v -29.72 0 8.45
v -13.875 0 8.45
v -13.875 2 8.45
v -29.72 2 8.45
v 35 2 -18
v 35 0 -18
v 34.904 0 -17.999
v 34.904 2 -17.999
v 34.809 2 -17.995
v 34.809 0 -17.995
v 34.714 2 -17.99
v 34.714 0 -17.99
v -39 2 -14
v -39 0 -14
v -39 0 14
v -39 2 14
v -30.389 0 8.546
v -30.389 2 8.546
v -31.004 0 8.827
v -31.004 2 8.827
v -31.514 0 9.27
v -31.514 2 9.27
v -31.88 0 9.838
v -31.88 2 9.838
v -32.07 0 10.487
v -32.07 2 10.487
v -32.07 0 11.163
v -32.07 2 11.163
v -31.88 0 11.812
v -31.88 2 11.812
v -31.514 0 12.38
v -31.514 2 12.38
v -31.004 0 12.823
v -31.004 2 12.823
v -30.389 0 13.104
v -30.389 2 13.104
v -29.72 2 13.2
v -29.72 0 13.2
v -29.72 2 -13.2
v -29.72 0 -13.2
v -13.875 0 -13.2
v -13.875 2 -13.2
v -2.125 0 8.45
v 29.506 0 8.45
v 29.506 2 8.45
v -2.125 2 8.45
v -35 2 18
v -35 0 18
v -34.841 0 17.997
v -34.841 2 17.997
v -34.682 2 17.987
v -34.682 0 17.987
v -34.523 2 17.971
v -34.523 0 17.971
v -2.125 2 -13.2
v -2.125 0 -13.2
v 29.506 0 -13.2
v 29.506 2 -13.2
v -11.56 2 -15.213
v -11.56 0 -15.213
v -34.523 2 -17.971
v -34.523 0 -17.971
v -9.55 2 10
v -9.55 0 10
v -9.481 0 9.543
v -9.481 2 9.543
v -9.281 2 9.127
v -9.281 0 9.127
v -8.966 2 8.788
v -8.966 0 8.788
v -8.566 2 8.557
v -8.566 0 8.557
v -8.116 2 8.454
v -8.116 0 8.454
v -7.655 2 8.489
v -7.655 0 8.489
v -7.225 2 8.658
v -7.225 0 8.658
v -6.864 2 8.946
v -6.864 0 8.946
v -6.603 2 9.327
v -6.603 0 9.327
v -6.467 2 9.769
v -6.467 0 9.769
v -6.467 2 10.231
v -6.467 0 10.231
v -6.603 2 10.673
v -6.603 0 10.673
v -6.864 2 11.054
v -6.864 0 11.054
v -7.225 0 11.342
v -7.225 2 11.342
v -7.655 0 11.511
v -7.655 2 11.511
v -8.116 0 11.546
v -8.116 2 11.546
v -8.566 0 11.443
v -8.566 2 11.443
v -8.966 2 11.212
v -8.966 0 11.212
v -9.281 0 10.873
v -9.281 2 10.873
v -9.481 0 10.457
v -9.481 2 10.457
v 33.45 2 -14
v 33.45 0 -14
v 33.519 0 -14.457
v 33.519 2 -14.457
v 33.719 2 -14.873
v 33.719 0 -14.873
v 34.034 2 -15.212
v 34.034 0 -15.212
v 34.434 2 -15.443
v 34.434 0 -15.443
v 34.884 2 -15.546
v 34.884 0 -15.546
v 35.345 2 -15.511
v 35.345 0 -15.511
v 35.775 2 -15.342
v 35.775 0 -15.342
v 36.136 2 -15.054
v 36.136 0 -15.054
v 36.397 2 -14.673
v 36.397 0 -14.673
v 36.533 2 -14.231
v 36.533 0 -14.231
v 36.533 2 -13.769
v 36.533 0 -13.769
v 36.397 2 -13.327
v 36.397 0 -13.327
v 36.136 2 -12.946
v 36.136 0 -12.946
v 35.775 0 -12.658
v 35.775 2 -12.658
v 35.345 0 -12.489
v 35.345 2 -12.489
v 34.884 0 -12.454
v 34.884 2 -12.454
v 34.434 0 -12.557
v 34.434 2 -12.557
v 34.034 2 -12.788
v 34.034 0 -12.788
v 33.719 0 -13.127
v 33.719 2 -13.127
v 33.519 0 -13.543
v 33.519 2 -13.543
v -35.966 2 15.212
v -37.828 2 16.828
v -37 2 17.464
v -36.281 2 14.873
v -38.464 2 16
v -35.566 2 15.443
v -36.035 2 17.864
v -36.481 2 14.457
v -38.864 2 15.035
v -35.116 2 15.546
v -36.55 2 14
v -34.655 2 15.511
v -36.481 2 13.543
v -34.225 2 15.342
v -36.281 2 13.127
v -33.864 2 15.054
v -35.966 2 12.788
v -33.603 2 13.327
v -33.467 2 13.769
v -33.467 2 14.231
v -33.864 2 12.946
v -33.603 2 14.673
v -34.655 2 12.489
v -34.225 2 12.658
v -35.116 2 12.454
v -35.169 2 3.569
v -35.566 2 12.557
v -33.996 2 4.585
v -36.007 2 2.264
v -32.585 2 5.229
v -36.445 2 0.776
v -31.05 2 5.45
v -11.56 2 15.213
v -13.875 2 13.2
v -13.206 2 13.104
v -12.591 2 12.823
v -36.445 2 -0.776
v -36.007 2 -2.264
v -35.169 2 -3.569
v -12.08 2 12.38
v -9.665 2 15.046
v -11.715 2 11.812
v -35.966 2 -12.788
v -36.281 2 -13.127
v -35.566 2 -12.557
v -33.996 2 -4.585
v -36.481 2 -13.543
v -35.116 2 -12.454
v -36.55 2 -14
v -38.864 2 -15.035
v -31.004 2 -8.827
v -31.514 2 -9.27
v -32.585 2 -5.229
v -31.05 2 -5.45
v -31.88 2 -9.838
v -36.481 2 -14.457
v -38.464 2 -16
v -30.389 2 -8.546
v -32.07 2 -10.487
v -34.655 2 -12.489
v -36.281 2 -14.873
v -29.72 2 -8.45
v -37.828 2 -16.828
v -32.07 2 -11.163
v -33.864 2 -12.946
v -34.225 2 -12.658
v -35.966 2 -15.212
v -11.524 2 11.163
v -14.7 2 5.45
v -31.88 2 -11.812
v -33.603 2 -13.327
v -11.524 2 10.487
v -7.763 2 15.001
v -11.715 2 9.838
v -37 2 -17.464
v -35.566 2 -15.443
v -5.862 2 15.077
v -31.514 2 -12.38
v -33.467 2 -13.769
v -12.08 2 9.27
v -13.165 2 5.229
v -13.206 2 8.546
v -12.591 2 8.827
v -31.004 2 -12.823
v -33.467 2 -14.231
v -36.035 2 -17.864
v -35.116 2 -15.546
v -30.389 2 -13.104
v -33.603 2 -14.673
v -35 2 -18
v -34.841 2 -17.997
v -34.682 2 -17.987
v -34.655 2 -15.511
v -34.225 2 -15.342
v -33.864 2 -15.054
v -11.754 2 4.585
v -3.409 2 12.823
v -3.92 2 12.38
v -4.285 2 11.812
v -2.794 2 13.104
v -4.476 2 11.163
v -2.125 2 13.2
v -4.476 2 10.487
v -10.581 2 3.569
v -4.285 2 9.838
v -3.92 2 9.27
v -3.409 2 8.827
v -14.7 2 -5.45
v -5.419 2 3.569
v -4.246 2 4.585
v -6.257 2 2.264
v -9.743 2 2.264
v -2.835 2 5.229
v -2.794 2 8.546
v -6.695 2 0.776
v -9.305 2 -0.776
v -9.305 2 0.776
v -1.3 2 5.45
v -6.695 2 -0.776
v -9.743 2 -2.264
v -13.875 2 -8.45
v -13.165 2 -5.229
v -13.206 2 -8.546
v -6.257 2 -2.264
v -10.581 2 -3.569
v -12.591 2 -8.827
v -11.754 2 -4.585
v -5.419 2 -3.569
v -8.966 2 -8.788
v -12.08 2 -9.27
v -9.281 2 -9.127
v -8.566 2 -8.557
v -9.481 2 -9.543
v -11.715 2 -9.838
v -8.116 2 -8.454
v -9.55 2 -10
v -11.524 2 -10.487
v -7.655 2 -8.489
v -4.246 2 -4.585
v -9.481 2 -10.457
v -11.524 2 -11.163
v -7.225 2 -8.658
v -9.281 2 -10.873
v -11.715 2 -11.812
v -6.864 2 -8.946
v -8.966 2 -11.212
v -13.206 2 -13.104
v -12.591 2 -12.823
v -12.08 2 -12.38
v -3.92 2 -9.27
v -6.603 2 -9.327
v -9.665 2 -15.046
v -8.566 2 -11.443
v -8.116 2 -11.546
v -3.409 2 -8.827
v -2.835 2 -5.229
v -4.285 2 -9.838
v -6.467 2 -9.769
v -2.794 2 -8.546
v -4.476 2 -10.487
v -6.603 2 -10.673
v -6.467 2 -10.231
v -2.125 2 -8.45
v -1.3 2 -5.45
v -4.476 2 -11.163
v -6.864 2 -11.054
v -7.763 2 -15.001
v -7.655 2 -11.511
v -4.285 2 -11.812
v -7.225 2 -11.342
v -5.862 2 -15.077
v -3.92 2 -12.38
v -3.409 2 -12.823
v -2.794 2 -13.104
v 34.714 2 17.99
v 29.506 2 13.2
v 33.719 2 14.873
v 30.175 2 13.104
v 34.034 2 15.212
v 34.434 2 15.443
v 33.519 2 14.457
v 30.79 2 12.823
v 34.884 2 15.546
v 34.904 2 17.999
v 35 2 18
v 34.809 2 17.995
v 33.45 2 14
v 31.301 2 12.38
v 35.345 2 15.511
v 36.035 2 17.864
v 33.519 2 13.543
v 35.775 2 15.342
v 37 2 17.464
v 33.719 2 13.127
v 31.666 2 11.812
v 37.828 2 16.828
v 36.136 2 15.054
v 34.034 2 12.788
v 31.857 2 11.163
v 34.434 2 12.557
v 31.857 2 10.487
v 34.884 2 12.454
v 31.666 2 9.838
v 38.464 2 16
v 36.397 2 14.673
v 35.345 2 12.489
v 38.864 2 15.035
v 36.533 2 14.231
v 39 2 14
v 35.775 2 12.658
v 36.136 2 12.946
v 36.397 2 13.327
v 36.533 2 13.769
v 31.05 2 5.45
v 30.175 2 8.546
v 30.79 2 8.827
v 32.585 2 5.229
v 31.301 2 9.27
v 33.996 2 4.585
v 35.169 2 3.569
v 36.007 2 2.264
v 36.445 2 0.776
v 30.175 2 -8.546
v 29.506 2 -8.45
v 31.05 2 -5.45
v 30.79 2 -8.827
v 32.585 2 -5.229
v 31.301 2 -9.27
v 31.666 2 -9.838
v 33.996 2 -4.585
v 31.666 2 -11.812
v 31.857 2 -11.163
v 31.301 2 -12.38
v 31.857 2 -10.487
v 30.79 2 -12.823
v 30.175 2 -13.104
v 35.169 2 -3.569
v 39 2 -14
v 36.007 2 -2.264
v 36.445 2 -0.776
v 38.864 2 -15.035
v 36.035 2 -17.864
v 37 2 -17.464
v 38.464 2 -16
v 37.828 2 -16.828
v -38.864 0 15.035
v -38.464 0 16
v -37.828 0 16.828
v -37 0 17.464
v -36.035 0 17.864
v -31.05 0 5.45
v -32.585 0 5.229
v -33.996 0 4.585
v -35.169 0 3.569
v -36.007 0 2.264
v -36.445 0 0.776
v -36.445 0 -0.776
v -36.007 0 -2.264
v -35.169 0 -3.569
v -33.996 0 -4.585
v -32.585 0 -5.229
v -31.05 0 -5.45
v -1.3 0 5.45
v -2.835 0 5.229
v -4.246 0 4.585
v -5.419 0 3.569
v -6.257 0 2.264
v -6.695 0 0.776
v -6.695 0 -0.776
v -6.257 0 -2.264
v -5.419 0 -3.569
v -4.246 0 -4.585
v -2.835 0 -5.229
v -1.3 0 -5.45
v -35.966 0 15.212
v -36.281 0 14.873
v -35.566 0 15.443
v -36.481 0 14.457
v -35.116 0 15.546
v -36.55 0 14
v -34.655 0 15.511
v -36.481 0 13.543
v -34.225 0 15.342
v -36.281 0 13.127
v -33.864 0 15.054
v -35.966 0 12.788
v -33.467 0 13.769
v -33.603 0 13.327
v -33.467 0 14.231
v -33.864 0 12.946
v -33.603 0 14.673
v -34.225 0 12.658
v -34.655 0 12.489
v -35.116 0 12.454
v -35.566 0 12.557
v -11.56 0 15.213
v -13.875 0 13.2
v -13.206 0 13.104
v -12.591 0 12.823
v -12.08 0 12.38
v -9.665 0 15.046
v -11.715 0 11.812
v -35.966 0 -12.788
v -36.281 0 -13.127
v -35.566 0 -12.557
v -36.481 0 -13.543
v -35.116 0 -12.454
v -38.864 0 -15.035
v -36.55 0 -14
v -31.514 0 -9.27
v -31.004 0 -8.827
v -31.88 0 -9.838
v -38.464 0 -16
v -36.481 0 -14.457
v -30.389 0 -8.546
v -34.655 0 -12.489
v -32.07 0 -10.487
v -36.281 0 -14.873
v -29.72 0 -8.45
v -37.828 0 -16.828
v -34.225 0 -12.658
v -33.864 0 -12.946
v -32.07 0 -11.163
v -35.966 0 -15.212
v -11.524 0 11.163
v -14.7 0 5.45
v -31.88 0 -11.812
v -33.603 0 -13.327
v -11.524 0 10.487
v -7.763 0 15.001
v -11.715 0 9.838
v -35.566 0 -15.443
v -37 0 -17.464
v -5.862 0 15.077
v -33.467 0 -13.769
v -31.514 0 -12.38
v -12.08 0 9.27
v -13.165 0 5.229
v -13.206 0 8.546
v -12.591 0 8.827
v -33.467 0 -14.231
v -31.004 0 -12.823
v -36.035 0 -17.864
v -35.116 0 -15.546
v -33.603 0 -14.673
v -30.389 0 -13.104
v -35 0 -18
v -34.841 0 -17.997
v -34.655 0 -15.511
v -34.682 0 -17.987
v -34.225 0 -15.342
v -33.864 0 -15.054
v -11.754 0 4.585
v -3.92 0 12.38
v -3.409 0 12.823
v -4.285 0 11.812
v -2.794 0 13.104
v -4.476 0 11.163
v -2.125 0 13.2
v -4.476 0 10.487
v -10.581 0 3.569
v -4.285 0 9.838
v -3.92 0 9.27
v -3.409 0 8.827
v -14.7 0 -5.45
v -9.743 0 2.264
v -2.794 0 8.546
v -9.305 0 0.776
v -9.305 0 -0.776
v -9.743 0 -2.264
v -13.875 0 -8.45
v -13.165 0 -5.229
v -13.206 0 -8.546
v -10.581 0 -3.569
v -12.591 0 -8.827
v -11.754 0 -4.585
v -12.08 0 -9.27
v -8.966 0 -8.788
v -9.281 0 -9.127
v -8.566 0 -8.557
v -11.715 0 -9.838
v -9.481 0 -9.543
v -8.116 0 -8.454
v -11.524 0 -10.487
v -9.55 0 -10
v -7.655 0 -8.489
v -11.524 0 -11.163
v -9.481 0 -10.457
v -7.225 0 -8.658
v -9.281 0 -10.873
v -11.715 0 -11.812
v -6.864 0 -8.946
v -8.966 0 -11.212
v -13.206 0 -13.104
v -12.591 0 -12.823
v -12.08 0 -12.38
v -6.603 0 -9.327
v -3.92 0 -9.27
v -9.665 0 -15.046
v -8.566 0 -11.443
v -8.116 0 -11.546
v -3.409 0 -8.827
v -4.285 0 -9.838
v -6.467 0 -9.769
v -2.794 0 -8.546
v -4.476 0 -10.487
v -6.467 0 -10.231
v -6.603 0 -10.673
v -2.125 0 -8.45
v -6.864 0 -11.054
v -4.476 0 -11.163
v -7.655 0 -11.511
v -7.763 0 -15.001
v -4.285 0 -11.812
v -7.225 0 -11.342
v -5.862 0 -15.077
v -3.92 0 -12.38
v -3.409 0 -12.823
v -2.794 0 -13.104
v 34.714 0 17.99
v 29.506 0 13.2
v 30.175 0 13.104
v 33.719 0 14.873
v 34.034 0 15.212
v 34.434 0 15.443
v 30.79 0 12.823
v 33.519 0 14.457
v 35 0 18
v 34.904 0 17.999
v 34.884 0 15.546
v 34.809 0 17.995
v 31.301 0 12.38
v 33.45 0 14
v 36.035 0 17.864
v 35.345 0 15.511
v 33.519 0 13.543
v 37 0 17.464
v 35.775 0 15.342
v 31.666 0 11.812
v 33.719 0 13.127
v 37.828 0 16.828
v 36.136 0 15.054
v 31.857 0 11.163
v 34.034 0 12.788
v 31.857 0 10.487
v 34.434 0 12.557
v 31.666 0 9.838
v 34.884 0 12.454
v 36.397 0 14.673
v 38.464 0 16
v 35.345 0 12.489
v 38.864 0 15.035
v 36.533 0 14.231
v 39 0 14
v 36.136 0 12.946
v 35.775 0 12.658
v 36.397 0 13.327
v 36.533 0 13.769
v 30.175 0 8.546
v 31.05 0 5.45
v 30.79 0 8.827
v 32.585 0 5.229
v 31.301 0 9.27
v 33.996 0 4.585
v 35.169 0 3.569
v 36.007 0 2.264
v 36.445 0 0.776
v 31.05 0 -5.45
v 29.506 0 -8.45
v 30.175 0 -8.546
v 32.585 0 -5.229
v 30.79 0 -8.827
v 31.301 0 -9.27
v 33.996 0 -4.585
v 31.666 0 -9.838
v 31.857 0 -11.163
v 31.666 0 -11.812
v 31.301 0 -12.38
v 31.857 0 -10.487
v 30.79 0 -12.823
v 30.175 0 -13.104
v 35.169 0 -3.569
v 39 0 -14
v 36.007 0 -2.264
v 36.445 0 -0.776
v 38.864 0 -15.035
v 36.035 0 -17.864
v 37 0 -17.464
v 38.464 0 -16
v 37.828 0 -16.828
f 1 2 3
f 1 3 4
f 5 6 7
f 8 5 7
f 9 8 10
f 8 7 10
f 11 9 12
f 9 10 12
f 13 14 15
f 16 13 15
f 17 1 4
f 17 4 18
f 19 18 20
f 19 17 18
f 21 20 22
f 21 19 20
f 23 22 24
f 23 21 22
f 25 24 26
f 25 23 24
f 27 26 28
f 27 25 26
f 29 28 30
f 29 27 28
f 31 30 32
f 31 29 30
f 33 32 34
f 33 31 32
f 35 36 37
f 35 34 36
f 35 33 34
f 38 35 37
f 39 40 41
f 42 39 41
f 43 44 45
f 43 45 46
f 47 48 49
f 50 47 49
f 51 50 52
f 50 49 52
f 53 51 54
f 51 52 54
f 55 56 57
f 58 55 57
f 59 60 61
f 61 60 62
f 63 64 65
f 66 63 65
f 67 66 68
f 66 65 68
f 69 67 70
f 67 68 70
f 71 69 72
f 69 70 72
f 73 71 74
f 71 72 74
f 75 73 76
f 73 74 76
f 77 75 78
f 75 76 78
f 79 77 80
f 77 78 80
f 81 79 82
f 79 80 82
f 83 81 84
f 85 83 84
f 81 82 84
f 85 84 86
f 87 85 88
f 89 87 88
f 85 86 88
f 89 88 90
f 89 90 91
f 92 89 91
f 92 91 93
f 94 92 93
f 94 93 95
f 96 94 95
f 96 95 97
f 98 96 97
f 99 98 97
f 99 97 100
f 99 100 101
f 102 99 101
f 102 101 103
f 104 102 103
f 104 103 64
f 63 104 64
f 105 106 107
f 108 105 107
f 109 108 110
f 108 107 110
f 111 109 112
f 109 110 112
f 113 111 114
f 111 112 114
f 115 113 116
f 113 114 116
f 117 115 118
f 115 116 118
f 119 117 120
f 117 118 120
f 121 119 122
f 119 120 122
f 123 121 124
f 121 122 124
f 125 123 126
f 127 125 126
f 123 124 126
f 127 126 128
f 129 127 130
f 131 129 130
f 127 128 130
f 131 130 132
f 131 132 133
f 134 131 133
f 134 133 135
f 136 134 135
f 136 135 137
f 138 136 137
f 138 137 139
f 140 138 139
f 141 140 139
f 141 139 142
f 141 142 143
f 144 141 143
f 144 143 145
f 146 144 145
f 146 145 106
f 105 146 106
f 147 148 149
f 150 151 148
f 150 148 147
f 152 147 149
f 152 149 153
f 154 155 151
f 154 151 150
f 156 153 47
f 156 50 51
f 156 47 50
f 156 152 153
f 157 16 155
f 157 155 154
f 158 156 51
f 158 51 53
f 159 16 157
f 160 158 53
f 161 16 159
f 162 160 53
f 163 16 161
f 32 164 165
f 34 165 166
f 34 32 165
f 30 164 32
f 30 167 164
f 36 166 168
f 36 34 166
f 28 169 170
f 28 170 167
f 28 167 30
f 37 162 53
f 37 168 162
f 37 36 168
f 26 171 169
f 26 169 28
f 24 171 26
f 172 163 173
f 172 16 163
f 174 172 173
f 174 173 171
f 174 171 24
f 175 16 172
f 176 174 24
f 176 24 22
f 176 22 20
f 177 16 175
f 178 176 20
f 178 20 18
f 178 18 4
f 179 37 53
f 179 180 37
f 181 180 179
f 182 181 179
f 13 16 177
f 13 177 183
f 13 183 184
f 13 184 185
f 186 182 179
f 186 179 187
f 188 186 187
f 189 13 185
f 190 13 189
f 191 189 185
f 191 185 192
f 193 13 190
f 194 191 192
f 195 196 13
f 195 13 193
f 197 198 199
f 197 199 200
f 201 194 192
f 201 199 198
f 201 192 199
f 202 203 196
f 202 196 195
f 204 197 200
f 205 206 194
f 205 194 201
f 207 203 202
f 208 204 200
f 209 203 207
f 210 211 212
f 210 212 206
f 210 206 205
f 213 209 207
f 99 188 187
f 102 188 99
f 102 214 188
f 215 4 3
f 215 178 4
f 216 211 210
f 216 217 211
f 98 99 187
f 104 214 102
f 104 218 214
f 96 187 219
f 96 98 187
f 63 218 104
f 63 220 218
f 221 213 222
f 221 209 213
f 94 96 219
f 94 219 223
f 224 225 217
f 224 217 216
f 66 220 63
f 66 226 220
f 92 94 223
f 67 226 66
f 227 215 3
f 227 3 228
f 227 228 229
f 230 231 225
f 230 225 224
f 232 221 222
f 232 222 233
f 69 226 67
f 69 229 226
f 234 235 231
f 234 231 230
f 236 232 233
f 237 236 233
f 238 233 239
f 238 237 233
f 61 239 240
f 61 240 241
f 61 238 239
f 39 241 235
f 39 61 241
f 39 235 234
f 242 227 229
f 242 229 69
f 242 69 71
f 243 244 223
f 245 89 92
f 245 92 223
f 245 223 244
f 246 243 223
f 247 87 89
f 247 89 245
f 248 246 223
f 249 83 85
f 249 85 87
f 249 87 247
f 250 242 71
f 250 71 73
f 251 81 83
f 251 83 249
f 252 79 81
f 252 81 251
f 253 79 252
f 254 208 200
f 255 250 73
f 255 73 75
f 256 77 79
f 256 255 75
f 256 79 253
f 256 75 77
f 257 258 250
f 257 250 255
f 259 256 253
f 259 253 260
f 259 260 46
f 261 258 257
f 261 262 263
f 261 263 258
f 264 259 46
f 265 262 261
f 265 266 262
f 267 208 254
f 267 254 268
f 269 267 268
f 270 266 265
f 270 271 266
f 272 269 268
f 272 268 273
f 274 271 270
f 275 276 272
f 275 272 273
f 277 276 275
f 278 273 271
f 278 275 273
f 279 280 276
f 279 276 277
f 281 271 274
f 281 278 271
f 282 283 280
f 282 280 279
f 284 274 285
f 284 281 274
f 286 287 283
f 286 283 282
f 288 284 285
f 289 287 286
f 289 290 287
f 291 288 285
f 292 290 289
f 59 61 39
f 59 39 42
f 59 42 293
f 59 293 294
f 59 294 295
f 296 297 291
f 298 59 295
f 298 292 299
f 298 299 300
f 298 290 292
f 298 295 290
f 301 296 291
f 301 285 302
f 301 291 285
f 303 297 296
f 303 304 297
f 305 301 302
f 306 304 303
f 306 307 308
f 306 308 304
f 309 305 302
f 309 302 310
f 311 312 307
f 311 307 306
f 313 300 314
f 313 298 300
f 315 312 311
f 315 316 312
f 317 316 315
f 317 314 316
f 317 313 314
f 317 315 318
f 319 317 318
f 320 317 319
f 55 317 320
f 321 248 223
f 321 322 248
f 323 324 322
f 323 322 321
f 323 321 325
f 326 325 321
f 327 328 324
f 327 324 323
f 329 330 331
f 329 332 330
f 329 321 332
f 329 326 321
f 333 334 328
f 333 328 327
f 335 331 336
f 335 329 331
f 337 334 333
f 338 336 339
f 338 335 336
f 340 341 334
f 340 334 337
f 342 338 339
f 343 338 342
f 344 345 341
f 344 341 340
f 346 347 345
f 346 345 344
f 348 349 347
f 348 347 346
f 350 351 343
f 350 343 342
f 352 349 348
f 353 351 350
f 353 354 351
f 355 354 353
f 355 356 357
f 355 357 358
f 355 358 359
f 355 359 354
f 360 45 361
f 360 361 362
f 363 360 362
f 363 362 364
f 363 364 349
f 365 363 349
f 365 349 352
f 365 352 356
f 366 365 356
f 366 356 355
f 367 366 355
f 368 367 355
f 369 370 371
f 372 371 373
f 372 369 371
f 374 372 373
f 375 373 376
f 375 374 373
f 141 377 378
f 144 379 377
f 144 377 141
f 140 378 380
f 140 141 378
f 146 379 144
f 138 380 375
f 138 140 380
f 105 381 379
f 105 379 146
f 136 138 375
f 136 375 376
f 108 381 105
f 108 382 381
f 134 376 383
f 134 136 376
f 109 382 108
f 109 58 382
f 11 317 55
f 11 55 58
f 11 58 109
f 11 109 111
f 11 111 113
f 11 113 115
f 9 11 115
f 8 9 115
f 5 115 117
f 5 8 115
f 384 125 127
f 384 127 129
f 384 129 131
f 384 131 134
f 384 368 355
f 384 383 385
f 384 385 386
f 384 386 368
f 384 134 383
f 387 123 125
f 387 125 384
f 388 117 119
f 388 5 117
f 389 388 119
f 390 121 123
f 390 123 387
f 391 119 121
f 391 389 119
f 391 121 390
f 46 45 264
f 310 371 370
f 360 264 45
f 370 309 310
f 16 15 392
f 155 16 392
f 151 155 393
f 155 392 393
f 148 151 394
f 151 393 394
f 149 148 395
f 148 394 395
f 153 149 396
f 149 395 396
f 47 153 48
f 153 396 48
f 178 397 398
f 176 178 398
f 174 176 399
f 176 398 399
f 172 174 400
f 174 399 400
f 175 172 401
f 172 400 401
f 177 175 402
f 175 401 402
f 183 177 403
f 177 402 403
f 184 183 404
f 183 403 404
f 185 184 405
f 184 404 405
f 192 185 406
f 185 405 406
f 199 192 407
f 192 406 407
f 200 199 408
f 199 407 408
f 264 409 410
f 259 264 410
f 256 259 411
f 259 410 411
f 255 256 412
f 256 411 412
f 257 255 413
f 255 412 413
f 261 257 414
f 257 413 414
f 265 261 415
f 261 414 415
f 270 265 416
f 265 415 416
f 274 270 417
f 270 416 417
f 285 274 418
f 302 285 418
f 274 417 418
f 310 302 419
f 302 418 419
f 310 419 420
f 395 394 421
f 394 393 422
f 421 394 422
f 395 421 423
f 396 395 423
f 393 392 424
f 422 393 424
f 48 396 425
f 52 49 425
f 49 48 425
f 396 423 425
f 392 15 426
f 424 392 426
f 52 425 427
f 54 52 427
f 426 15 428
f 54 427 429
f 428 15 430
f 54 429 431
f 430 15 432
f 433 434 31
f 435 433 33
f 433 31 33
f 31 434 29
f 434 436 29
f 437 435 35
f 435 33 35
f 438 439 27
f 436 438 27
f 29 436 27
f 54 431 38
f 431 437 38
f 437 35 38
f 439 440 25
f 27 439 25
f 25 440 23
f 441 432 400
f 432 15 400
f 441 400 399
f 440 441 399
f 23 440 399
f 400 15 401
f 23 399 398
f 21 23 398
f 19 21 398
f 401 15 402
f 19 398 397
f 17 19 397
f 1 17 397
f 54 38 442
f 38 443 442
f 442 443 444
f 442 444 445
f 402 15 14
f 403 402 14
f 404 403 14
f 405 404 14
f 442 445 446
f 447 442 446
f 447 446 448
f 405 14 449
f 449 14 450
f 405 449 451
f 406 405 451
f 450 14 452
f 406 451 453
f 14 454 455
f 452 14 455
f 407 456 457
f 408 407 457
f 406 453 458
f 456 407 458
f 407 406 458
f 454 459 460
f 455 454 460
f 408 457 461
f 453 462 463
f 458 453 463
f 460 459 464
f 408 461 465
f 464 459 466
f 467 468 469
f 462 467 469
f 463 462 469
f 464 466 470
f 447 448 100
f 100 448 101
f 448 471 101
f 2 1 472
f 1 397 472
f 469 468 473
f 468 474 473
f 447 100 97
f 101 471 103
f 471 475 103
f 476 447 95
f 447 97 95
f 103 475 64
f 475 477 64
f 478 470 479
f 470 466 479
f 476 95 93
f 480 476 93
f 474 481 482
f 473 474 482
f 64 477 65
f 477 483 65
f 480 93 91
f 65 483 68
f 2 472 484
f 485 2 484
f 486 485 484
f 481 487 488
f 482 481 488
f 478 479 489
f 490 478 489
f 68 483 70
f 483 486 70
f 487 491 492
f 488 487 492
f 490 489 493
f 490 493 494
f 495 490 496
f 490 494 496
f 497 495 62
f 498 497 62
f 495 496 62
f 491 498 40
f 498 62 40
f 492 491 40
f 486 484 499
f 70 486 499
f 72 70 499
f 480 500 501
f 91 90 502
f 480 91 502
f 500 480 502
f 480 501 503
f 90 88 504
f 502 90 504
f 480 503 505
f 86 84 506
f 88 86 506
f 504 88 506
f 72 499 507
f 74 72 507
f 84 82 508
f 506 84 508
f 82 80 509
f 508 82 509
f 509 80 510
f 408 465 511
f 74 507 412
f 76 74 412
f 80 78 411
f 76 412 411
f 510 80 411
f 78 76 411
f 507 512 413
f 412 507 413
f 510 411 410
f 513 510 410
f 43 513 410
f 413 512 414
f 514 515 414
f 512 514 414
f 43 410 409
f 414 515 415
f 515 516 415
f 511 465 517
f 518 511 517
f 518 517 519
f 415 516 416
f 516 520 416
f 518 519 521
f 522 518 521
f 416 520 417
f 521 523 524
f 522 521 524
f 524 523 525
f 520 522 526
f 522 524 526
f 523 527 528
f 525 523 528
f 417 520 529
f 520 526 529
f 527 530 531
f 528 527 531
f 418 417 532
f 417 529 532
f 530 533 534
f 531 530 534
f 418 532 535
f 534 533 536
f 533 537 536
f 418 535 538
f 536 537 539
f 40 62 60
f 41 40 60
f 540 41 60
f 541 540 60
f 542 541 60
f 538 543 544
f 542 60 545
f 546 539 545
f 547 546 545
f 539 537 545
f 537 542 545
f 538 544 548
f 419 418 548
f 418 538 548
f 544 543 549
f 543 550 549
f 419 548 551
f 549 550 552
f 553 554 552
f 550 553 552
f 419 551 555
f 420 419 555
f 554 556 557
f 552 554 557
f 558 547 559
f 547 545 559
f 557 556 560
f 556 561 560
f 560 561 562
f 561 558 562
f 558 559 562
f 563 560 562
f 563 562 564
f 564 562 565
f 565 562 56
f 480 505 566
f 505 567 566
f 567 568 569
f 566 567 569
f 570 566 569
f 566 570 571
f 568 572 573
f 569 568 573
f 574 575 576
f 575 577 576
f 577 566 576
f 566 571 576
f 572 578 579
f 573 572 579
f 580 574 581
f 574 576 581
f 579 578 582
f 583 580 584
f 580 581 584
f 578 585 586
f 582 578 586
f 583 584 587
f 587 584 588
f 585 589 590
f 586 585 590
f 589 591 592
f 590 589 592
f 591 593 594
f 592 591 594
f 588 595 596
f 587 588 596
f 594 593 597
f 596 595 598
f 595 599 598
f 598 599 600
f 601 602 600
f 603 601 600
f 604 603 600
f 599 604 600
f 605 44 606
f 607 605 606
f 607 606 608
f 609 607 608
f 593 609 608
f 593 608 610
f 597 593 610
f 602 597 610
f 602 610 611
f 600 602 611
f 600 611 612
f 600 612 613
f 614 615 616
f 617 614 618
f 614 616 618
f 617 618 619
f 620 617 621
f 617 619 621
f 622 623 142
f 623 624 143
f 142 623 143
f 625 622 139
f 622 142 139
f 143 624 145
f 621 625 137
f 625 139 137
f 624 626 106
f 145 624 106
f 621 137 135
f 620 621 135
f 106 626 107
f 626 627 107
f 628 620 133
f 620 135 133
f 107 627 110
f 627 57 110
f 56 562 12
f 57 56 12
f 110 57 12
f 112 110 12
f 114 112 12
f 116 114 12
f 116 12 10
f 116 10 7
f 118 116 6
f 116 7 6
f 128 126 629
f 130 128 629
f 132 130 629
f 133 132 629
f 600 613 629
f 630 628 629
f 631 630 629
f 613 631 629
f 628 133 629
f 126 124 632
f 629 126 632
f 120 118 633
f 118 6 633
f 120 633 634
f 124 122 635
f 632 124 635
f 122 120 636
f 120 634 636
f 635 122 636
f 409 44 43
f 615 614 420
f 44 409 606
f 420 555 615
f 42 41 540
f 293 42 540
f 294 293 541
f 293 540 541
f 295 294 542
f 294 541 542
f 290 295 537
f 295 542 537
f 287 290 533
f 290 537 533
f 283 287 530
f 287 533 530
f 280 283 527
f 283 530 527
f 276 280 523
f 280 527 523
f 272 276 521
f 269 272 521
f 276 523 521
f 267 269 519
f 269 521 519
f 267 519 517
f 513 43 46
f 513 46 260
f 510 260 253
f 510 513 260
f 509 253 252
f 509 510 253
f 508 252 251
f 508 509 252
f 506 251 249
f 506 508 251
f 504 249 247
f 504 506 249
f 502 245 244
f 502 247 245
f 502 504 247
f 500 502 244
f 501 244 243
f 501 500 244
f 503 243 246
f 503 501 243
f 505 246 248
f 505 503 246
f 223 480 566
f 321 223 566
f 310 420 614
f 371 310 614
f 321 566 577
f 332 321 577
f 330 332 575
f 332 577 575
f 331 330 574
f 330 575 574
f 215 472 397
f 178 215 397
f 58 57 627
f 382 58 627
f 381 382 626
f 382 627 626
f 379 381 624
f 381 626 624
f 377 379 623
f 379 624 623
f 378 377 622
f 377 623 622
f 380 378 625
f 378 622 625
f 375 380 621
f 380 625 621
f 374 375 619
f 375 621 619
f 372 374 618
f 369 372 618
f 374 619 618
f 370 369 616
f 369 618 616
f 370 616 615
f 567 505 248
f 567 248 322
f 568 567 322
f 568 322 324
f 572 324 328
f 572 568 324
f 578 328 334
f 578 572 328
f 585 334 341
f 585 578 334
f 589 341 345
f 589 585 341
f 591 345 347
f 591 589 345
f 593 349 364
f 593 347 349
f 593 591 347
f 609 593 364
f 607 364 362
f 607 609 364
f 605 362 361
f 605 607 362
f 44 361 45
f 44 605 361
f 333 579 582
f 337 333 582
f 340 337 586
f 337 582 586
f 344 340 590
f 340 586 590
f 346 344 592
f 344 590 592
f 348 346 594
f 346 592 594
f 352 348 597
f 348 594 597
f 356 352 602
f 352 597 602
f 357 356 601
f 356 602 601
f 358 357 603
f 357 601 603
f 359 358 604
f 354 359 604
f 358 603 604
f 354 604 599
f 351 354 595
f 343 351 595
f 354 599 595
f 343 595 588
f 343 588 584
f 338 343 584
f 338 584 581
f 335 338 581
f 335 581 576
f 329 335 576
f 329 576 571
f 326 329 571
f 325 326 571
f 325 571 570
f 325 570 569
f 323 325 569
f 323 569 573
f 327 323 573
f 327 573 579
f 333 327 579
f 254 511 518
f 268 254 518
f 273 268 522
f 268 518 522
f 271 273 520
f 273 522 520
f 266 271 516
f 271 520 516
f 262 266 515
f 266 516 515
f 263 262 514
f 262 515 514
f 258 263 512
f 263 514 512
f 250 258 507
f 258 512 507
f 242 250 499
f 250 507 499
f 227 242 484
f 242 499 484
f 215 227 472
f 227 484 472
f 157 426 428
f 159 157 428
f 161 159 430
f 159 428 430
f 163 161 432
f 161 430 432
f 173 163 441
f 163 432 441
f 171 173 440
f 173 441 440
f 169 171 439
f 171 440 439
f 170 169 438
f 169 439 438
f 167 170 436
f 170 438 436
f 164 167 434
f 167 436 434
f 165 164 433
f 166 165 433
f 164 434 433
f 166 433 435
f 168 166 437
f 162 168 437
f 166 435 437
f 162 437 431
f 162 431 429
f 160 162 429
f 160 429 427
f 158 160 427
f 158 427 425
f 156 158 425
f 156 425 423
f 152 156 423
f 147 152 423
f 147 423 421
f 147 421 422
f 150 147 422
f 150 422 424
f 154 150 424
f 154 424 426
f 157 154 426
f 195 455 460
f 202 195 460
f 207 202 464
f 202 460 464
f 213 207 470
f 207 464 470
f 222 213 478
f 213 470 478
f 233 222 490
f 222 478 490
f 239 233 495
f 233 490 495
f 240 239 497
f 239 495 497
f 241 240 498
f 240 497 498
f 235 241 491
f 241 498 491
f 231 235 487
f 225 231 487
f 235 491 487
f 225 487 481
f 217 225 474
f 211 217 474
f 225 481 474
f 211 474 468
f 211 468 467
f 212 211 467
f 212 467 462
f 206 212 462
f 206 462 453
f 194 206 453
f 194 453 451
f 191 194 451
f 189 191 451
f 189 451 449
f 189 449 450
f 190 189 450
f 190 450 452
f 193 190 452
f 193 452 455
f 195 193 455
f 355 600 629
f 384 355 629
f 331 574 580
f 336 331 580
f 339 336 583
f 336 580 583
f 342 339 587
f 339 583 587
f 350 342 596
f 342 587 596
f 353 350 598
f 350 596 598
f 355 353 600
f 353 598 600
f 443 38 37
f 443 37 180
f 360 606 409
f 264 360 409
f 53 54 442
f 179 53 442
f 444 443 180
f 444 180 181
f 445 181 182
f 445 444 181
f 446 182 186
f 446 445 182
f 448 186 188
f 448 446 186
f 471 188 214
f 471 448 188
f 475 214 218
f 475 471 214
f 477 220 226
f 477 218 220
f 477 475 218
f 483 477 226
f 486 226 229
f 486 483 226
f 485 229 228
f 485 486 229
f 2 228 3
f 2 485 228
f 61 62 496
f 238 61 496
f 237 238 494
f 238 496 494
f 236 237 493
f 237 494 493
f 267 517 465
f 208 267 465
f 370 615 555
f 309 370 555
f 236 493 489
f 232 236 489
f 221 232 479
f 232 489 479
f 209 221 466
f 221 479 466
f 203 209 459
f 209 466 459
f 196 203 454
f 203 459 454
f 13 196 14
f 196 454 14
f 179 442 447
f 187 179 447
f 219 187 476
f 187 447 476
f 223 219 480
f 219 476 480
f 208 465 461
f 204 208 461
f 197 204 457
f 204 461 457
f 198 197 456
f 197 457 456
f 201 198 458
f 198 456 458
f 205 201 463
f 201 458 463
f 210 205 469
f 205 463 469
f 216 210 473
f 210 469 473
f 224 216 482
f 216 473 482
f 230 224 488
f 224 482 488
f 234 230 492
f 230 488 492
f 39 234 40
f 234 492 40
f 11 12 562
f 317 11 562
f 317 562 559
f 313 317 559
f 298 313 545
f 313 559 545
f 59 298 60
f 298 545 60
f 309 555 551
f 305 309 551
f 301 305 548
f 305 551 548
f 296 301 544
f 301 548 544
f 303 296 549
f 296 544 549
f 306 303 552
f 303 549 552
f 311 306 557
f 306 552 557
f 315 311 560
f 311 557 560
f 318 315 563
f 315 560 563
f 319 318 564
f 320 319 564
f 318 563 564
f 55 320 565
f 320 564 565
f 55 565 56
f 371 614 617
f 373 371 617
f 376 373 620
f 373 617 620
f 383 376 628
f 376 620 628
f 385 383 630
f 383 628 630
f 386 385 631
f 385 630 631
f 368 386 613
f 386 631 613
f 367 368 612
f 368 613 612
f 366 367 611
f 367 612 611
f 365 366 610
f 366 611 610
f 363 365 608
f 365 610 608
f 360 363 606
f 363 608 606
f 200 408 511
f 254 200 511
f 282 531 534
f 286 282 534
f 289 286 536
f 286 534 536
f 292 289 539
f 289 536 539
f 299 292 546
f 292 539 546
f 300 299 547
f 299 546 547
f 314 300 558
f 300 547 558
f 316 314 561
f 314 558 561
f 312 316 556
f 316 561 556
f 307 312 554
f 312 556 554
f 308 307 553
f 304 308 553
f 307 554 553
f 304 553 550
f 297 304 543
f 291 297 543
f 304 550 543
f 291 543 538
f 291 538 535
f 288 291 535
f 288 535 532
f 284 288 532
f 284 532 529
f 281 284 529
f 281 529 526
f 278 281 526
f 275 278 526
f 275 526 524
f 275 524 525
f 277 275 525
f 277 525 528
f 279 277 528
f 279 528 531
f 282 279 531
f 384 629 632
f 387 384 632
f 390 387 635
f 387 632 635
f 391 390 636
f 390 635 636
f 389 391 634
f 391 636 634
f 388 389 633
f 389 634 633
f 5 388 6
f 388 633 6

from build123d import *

# Parameters (mm, degrees)
EXTRUDE_1_DEPTH          = 2
HOLE_WIZARD_1_D          = 3.1
CUT_EXTRUDE_1_DEPTH      = 44
CUT_EXTRUDE_1_DEPTH_BACK = 44
SKETCH_5_W               = 102.055692614
SKETCH_5_H               = 55.211945292
CUT_EXTRUDE_2_DEPTH      = 44
CUT_EXTRUDE_2_DEPTH_BACK = 44


with BuildPart() as part:
    # 草图1 → 凸台-拉伸1 (new body)
    with BuildSketch(Plane(origin=(0, 0, 0), x_dir=(1, 0, 0), z_dir=(0, 1, 0))):
        with BuildLine():
            Line((35, 18), (-35, 18))
            ThreePointArc((-35, 18), (-37.828427125, 16.828427125), (-39, 14))
            Line((-39, 14), (-39, -14))
            ThreePointArc((-39, -14), (-37.828427125, -16.828427125), (-35, -18))
            Line((-35, -18), (35, -18))
            ThreePointArc((35, -18), (37.828427125, -16.828427125), (39, -14))
            Line((39, -14), (39, 14))
            ThreePointArc((39, 14), (37.828427125, 16.828427125), (35, 18))
        make_face()
    extrude(amount=EXTRUDE_1_DEPTH)

    # 孔1 (through all)
    with Locations(Plane(origin=(0, 2, 0), x_dir=(1, 0, 0), z_dir=(0, 1, 0))):
        with Locations((-8, 10), (-8, -10), (-35, -14), (-35, 14), (35, 14), (35, -14)):
            Hole(HOLE_WIZARD_1_D / 2)

    # 草图5 → 切除-拉伸1 (cut, two sides: drawn at the far end of the back side and taken through both)
    with BuildSketch(Plane(origin=(0, 2, 0), x_dir=(1, 0, 0), z_dir=(0, 1, 0)).offset(-CUT_EXTRUDE_1_DEPTH_BACK)):
        Rectangle(SKETCH_5_W, SKETCH_5_H)
        with BuildLine():
            Line((-11.560116303, 15.213061974), (-34.522933375, 17.971449035))
            ThreePointArc((-34.522933375, 17.971449035), (-37.65440516, 16.992345777), (-39, 14))
            Line((-39, 14), (-39, -14))
            ThreePointArc((-39, -14), (-37.65440516, -16.992345777), (-34.522933375, -17.971449035))
            Line((-34.522933375, -17.971449035), (-11.560116303, -15.213061974))
            ThreePointArc((-11.560116303, -15.213061974), (-8.714551025, -15.008553692), (-5.862458688, -15.076632276))
            Line((-5.862458688, -15.076632276), (34.713562836, -17.989731037))
            ThreePointArc((34.713562836, -17.989731037), (37.725275339, -16.927947118), (39, -14))
            Line((39, -14), (39, 14))
            ThreePointArc((39, 14), (37.725275339, 16.927947118), (34.713562836, 17.989731037))
            Line((34.713562836, 17.989731037), (-5.862458688, 15.076632276))
            ThreePointArc((-5.862458688, 15.076632276), (-8.714551025, 15.008553692), (-11.560116303, 15.213061974))
        make_face(mode=Mode.SUBTRACT)
    extrude(amount=CUT_EXTRUDE_1_DEPTH + CUT_EXTRUDE_1_DEPTH_BACK, mode=Mode.SUBTRACT)

    # 草图6 → 切除-拉伸2 (cut, two sides: drawn at the far end of the back side and taken through both)
    with BuildSketch(Plane(origin=(0, 2, 0), x_dir=(1, 0, 0), z_dir=(0, 1, 0)).offset(-CUT_EXTRUDE_2_DEPTH_BACK)):
        with BuildLine():
            Line((-2.125, 13.2), (29.5058803, 13.2))
            ThreePointArc((29.5058803, 13.2), (31.8808803, 10.825), (29.5058803, 8.45))
            Line((29.5058803, 8.45), (-2.125, 8.45))
            ThreePointArc((-2.125, 8.45), (-4.5, 10.825), (-2.125, 13.2))
        make_face()
        with BuildLine():
            Line((-13.875, 8.45), (-29.719593784, 8.45))
            ThreePointArc((-29.719593784, 8.45), (-32.094593784, 10.825), (-29.719593784, 13.2))
            Line((-29.719593784, 13.2), (-13.875, 13.2))
            ThreePointArc((-13.875, 13.2), (-11.5, 10.825), (-13.875, 8.45))
        make_face()
        with BuildLine():
            Line((-2.125, -13.2), (29.5058803, -13.2))
            ThreePointArc((29.5058803, -13.2), (31.8808803, -10.825), (29.5058803, -8.45))
            Line((29.5058803, -8.45), (-2.125, -8.45))
            ThreePointArc((-2.125, -8.45), (-4.5, -10.825), (-2.125, -13.2))
        make_face()
        with BuildLine():
            Line((-13.875, -8.45), (-29.719593784, -8.45))
            ThreePointArc((-29.719593784, -8.45), (-32.094593784, -10.825), (-29.719593784, -13.2))
            Line((-29.719593784, -13.2), (-13.875, -13.2))
            ThreePointArc((-13.875, -13.2), (-11.5, -10.825), (-13.875, -8.45))
        make_face()
        with BuildLine():
            Line((-31.05, 5.45), (-14.7, 5.45))
            ThreePointArc((-14.7, 5.45), (-9.25, 0), (-14.7, -5.45))
            Line((-14.7, -5.45), (-31.05, -5.45))
            ThreePointArc((-31.05, -5.45), (-36.5, 0), (-31.05, 5.45))
        make_face()
        with BuildLine():
            Line((-1.3, 5.45), (31.05, 5.45))
            ThreePointArc((31.05, 5.45), (36.5, 0), (31.05, -5.45))
            Line((31.05, -5.45), (-1.3, -5.45))
            ThreePointArc((-1.3, -5.45), (-6.75, 0), (-1.3, 5.45))
        make_face()
    extrude(amount=CUT_EXTRUDE_2_DEPTH + CUT_EXTRUDE_2_DEPTH_BACK, mode=Mode.SUBTRACT)


solid = part.part
